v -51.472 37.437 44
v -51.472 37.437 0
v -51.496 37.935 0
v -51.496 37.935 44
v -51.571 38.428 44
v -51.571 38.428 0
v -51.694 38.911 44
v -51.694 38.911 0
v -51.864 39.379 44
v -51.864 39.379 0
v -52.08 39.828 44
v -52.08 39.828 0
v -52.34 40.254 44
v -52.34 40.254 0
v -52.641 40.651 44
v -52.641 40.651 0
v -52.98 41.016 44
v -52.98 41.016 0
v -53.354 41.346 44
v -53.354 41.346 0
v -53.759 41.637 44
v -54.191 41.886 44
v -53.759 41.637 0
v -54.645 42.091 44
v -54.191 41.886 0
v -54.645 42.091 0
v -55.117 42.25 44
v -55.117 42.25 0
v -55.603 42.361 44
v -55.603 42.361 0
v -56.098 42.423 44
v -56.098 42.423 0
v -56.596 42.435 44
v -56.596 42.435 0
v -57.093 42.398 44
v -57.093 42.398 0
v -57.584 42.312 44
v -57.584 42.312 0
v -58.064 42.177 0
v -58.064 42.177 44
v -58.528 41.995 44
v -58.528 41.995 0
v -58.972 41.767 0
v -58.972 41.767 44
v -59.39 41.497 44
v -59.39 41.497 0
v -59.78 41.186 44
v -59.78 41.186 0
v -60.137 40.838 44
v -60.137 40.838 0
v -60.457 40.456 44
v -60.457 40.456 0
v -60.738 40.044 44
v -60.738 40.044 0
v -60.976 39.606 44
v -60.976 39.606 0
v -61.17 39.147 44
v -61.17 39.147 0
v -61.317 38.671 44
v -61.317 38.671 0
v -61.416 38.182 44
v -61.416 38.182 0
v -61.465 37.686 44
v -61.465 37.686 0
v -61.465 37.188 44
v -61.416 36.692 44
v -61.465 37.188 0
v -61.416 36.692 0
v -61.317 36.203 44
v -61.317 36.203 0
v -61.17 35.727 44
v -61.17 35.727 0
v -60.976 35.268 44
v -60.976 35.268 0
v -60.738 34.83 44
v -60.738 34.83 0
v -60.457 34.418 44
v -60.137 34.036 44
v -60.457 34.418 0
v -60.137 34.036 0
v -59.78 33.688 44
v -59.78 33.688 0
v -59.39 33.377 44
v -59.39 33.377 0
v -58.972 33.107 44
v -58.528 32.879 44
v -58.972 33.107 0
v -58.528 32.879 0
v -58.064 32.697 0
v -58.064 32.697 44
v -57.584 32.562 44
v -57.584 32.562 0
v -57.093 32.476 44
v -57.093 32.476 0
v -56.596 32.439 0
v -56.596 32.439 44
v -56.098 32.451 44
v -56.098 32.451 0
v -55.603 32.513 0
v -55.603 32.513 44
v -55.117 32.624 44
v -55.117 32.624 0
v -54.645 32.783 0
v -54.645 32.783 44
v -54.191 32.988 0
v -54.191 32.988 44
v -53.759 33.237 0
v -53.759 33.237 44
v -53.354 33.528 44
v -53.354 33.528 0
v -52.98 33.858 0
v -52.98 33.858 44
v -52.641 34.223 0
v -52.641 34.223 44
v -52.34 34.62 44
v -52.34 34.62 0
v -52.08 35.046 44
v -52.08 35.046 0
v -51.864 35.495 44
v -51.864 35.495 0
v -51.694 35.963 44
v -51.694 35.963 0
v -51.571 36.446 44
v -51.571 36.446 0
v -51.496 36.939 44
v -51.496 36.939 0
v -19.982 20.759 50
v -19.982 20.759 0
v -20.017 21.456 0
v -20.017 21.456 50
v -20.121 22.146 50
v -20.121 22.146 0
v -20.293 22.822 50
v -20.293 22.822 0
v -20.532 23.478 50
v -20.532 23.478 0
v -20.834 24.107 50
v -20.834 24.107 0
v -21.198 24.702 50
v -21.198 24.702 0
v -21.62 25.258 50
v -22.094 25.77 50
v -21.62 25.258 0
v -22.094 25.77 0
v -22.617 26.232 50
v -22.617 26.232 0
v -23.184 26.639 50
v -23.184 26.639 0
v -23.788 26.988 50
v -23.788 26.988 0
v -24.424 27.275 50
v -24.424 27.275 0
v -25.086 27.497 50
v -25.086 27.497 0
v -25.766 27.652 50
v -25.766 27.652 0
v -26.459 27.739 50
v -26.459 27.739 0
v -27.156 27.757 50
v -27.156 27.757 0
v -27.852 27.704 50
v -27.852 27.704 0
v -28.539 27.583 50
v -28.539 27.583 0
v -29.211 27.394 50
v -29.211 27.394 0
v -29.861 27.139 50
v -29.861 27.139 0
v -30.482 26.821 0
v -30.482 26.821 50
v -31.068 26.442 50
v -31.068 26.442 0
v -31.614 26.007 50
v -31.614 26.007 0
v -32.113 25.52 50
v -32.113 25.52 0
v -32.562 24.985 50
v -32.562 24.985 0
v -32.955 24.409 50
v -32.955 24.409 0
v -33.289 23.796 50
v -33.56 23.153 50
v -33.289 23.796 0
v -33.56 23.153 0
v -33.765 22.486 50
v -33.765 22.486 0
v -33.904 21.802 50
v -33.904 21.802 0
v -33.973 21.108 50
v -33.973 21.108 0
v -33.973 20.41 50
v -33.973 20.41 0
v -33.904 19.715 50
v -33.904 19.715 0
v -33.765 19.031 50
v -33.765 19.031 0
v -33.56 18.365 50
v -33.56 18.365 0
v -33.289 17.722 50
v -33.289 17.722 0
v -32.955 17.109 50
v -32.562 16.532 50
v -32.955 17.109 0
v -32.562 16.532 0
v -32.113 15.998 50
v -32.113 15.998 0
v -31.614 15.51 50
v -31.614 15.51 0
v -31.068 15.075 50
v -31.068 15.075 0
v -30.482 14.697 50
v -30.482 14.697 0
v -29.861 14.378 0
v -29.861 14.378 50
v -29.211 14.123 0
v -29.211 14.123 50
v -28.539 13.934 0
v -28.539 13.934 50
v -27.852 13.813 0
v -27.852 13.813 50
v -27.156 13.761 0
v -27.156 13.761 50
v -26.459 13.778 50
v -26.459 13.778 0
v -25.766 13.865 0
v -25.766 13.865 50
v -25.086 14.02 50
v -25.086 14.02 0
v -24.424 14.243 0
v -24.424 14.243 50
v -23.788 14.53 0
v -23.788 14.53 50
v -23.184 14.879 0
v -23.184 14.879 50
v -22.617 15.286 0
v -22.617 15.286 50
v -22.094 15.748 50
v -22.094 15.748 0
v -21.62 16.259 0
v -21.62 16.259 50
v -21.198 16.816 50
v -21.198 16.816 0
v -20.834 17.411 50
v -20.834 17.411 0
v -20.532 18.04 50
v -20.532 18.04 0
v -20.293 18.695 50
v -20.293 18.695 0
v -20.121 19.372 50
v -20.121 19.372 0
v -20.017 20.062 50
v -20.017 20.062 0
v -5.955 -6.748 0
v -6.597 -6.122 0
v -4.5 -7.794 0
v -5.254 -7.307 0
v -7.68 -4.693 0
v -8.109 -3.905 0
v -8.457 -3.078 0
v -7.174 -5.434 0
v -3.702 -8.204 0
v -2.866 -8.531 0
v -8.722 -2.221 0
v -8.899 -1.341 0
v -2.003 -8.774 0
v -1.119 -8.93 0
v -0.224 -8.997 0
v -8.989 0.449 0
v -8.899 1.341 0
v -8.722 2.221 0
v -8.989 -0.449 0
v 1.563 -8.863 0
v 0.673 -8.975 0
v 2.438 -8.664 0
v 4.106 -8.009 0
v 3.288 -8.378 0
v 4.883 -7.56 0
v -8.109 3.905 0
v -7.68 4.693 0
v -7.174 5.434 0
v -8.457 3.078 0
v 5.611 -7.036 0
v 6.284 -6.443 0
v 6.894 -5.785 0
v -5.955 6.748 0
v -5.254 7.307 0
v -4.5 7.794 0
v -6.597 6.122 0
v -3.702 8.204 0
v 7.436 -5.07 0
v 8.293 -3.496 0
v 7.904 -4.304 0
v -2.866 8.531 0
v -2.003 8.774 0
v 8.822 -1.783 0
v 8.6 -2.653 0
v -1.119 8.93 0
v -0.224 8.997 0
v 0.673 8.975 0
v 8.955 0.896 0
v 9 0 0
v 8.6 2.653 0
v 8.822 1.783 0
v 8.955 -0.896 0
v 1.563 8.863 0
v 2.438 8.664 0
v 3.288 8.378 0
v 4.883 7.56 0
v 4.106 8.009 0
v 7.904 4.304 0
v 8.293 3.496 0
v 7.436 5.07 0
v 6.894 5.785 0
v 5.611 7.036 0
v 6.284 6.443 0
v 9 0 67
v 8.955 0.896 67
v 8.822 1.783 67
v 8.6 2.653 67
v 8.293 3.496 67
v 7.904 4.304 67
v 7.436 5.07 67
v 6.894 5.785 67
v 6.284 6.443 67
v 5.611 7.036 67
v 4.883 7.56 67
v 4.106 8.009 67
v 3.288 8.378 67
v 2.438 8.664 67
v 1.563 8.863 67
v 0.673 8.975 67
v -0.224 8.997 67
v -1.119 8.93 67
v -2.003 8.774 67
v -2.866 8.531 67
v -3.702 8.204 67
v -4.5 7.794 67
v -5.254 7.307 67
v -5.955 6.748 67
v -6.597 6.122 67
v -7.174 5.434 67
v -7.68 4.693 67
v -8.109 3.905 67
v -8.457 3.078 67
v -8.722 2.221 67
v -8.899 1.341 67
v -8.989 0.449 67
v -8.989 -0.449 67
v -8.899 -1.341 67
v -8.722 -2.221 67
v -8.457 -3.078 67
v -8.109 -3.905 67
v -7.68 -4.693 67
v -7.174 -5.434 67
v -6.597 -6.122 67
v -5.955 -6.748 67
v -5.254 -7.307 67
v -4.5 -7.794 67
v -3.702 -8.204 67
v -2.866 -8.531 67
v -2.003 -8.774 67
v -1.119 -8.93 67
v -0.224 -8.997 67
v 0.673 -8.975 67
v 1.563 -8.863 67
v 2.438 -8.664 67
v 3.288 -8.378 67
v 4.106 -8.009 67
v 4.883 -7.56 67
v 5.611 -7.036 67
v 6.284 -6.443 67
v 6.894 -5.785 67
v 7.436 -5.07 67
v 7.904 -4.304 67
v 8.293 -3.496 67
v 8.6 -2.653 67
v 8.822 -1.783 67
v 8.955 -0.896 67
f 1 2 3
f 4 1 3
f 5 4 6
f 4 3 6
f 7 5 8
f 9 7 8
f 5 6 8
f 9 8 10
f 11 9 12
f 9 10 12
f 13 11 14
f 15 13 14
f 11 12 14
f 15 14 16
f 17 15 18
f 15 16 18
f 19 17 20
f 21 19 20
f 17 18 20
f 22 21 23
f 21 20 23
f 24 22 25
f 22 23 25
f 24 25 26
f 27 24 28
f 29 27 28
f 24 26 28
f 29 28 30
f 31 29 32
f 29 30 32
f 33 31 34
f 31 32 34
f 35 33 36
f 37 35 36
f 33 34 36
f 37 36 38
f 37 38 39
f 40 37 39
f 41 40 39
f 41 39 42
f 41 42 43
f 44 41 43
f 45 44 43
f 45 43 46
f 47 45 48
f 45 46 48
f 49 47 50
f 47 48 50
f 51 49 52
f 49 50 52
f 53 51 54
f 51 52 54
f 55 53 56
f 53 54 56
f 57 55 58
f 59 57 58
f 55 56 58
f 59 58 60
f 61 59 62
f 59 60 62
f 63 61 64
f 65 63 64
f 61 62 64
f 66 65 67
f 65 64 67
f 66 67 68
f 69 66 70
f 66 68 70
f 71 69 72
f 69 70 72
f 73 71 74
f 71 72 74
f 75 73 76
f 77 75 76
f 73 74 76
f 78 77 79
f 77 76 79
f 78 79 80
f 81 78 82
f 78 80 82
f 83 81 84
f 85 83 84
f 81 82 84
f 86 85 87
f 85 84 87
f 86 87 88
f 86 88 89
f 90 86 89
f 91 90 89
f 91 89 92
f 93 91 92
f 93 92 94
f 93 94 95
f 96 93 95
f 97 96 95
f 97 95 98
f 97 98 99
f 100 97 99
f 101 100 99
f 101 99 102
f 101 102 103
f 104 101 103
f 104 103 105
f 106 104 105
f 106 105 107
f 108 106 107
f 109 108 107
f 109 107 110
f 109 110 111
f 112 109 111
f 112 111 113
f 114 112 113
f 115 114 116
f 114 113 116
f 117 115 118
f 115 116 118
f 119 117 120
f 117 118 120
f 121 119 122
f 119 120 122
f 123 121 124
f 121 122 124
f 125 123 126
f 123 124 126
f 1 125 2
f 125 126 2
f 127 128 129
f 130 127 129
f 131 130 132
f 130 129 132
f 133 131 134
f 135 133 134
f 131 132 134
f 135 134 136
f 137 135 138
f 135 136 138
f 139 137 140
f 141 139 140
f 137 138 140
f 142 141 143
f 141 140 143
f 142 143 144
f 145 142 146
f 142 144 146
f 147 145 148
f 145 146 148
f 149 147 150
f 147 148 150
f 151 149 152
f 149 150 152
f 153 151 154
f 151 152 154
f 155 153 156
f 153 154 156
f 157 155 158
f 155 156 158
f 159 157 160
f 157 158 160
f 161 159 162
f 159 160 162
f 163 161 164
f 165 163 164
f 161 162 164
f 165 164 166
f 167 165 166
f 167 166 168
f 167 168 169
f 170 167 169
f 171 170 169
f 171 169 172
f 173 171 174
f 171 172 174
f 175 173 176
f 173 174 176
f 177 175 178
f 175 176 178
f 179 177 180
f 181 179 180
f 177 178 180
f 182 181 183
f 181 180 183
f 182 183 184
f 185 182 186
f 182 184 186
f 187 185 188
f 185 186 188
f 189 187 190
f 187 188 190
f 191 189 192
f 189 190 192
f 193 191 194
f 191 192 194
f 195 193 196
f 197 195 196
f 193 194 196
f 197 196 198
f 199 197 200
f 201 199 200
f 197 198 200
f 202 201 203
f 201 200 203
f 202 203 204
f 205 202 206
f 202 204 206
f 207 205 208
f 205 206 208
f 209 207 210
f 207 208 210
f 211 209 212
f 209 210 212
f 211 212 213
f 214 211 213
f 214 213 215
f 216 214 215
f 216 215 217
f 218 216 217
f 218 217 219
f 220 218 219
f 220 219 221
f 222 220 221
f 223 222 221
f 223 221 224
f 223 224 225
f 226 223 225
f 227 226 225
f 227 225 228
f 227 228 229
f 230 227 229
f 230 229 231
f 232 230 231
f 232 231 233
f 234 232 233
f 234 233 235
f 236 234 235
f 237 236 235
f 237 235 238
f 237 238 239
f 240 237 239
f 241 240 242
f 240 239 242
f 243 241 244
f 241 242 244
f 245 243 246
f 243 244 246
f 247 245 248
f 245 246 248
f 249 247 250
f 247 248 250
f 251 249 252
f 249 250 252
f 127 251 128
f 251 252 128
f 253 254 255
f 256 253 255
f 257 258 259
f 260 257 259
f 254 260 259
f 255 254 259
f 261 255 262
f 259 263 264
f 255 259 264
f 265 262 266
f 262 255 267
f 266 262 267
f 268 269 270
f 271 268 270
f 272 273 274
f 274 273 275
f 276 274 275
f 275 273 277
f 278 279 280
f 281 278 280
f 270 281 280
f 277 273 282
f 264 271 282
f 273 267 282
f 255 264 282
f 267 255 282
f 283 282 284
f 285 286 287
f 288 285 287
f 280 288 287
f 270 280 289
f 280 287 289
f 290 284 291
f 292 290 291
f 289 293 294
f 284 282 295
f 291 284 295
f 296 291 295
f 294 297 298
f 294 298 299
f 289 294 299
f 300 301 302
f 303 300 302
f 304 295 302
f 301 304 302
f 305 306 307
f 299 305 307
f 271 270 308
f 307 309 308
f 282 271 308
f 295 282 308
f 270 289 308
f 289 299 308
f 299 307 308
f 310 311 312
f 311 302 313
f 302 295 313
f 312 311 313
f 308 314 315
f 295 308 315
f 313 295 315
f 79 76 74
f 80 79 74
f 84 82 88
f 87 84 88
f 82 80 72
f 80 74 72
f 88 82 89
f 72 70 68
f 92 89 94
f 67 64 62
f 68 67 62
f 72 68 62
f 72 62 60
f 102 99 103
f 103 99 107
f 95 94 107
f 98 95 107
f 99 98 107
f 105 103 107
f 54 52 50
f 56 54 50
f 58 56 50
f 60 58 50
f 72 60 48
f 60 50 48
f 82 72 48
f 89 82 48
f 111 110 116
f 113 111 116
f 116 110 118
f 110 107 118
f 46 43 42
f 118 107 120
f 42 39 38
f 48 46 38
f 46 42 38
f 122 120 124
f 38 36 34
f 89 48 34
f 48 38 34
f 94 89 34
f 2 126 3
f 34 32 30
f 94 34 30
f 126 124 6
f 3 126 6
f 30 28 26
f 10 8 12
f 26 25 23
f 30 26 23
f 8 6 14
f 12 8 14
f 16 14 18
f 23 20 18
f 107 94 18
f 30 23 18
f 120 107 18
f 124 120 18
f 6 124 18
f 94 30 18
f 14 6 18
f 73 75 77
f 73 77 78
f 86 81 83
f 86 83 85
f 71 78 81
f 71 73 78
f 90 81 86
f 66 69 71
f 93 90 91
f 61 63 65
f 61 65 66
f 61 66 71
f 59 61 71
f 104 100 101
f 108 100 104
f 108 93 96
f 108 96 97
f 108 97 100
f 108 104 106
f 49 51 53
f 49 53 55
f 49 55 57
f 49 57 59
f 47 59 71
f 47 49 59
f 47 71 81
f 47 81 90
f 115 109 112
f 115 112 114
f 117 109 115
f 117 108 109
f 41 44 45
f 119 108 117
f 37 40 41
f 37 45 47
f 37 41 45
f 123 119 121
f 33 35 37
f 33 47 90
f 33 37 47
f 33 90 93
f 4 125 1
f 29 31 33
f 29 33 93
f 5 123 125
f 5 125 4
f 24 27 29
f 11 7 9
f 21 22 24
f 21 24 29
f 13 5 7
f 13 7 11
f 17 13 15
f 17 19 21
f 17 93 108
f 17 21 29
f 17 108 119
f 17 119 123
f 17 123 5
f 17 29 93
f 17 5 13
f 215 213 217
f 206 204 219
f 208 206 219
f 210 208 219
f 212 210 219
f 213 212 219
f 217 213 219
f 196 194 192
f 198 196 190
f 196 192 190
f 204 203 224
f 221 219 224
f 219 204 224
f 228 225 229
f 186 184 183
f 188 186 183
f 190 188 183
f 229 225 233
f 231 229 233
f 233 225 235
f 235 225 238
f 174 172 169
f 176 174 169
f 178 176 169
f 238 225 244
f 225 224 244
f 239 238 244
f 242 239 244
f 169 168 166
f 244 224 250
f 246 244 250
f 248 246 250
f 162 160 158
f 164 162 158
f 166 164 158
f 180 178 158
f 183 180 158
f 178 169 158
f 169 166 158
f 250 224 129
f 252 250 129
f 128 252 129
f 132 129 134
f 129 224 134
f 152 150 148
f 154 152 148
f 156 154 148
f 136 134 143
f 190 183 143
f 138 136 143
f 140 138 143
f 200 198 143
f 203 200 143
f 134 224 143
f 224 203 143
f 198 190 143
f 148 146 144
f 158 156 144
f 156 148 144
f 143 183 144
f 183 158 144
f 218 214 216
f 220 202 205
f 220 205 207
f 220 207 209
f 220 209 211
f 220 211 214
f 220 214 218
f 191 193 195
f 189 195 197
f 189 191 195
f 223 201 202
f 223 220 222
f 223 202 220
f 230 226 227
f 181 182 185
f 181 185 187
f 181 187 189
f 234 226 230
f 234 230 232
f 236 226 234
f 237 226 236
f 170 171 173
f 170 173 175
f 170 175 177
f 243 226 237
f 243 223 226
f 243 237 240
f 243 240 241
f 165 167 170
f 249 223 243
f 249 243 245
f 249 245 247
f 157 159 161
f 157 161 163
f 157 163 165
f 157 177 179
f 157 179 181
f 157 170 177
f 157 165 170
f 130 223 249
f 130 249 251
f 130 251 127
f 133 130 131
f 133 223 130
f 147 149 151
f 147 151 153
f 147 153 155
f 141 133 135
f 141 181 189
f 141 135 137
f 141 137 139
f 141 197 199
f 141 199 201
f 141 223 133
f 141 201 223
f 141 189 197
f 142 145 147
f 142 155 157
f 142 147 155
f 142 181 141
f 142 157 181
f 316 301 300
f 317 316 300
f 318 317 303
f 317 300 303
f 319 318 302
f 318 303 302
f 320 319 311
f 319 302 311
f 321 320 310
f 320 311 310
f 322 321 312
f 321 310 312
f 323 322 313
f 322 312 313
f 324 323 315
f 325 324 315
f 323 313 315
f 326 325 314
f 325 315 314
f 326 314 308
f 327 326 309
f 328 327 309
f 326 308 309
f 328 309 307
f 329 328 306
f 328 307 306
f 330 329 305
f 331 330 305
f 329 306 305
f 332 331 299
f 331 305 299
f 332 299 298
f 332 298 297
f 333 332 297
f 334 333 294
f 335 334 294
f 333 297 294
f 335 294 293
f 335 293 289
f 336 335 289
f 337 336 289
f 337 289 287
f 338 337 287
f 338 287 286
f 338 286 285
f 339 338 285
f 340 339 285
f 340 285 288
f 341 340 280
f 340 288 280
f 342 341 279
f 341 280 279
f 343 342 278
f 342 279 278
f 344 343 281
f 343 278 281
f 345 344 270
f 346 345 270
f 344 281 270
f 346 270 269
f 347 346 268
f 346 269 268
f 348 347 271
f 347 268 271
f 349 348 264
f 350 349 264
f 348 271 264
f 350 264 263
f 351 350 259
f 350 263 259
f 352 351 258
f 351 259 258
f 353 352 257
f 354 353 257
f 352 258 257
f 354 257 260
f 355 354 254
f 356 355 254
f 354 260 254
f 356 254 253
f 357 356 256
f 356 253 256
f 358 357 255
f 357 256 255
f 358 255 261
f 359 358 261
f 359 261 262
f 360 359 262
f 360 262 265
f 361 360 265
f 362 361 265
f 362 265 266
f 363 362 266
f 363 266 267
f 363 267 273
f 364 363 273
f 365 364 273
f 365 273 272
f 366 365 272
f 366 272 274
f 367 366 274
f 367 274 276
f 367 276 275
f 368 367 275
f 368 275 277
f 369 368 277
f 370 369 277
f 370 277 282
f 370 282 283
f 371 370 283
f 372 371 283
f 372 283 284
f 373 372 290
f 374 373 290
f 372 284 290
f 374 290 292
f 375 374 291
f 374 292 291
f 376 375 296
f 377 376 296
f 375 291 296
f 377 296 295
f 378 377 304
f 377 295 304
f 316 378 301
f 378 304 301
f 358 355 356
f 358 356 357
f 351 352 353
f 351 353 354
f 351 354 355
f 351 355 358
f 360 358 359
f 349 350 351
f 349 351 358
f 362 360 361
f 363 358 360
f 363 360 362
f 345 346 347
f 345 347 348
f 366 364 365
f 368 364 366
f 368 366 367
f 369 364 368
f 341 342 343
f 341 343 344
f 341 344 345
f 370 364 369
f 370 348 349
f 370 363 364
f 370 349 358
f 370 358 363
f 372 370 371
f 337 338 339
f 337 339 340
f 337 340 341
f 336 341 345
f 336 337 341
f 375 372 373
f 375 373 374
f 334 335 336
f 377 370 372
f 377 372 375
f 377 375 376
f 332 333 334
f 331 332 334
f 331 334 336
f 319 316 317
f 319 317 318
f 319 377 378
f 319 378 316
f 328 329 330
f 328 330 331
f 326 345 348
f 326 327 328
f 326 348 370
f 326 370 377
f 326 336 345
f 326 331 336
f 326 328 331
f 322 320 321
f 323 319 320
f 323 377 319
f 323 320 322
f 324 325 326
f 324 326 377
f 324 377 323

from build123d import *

# Parameters (mm, degrees)
F0_R     = 9
F1_DEPTH = 67
F2_R     = 7
F3_DEPTH = 50
F4_R     = 5
F5_DEPTH = 44


with BuildPart() as f1:
    # F0 (on Top) → F1 (new body)
    with BuildSketch(Plane.XY):
        Circle(F0_R)
    extrude(amount=F1_DEPTH)


with BuildPart() as f3:
    # F2 (on Top) → F3 (new body)
    with BuildSketch(Plane.XY):
        with Locations((-26.981844, 20.758759)):
            Circle(F2_R)
    extrude(amount=F3_DEPTH)


with BuildPart() as f5:
    # F4 (on Top) → F5 (new body)
    with BuildSketch(Plane.XY):
        with Locations((-56.471605, 37.436996)):
            Circle(F4_R)
    extrude(amount=F5_DEPTH)


solid = Compound([f1.part, f3.part, f5.part])
